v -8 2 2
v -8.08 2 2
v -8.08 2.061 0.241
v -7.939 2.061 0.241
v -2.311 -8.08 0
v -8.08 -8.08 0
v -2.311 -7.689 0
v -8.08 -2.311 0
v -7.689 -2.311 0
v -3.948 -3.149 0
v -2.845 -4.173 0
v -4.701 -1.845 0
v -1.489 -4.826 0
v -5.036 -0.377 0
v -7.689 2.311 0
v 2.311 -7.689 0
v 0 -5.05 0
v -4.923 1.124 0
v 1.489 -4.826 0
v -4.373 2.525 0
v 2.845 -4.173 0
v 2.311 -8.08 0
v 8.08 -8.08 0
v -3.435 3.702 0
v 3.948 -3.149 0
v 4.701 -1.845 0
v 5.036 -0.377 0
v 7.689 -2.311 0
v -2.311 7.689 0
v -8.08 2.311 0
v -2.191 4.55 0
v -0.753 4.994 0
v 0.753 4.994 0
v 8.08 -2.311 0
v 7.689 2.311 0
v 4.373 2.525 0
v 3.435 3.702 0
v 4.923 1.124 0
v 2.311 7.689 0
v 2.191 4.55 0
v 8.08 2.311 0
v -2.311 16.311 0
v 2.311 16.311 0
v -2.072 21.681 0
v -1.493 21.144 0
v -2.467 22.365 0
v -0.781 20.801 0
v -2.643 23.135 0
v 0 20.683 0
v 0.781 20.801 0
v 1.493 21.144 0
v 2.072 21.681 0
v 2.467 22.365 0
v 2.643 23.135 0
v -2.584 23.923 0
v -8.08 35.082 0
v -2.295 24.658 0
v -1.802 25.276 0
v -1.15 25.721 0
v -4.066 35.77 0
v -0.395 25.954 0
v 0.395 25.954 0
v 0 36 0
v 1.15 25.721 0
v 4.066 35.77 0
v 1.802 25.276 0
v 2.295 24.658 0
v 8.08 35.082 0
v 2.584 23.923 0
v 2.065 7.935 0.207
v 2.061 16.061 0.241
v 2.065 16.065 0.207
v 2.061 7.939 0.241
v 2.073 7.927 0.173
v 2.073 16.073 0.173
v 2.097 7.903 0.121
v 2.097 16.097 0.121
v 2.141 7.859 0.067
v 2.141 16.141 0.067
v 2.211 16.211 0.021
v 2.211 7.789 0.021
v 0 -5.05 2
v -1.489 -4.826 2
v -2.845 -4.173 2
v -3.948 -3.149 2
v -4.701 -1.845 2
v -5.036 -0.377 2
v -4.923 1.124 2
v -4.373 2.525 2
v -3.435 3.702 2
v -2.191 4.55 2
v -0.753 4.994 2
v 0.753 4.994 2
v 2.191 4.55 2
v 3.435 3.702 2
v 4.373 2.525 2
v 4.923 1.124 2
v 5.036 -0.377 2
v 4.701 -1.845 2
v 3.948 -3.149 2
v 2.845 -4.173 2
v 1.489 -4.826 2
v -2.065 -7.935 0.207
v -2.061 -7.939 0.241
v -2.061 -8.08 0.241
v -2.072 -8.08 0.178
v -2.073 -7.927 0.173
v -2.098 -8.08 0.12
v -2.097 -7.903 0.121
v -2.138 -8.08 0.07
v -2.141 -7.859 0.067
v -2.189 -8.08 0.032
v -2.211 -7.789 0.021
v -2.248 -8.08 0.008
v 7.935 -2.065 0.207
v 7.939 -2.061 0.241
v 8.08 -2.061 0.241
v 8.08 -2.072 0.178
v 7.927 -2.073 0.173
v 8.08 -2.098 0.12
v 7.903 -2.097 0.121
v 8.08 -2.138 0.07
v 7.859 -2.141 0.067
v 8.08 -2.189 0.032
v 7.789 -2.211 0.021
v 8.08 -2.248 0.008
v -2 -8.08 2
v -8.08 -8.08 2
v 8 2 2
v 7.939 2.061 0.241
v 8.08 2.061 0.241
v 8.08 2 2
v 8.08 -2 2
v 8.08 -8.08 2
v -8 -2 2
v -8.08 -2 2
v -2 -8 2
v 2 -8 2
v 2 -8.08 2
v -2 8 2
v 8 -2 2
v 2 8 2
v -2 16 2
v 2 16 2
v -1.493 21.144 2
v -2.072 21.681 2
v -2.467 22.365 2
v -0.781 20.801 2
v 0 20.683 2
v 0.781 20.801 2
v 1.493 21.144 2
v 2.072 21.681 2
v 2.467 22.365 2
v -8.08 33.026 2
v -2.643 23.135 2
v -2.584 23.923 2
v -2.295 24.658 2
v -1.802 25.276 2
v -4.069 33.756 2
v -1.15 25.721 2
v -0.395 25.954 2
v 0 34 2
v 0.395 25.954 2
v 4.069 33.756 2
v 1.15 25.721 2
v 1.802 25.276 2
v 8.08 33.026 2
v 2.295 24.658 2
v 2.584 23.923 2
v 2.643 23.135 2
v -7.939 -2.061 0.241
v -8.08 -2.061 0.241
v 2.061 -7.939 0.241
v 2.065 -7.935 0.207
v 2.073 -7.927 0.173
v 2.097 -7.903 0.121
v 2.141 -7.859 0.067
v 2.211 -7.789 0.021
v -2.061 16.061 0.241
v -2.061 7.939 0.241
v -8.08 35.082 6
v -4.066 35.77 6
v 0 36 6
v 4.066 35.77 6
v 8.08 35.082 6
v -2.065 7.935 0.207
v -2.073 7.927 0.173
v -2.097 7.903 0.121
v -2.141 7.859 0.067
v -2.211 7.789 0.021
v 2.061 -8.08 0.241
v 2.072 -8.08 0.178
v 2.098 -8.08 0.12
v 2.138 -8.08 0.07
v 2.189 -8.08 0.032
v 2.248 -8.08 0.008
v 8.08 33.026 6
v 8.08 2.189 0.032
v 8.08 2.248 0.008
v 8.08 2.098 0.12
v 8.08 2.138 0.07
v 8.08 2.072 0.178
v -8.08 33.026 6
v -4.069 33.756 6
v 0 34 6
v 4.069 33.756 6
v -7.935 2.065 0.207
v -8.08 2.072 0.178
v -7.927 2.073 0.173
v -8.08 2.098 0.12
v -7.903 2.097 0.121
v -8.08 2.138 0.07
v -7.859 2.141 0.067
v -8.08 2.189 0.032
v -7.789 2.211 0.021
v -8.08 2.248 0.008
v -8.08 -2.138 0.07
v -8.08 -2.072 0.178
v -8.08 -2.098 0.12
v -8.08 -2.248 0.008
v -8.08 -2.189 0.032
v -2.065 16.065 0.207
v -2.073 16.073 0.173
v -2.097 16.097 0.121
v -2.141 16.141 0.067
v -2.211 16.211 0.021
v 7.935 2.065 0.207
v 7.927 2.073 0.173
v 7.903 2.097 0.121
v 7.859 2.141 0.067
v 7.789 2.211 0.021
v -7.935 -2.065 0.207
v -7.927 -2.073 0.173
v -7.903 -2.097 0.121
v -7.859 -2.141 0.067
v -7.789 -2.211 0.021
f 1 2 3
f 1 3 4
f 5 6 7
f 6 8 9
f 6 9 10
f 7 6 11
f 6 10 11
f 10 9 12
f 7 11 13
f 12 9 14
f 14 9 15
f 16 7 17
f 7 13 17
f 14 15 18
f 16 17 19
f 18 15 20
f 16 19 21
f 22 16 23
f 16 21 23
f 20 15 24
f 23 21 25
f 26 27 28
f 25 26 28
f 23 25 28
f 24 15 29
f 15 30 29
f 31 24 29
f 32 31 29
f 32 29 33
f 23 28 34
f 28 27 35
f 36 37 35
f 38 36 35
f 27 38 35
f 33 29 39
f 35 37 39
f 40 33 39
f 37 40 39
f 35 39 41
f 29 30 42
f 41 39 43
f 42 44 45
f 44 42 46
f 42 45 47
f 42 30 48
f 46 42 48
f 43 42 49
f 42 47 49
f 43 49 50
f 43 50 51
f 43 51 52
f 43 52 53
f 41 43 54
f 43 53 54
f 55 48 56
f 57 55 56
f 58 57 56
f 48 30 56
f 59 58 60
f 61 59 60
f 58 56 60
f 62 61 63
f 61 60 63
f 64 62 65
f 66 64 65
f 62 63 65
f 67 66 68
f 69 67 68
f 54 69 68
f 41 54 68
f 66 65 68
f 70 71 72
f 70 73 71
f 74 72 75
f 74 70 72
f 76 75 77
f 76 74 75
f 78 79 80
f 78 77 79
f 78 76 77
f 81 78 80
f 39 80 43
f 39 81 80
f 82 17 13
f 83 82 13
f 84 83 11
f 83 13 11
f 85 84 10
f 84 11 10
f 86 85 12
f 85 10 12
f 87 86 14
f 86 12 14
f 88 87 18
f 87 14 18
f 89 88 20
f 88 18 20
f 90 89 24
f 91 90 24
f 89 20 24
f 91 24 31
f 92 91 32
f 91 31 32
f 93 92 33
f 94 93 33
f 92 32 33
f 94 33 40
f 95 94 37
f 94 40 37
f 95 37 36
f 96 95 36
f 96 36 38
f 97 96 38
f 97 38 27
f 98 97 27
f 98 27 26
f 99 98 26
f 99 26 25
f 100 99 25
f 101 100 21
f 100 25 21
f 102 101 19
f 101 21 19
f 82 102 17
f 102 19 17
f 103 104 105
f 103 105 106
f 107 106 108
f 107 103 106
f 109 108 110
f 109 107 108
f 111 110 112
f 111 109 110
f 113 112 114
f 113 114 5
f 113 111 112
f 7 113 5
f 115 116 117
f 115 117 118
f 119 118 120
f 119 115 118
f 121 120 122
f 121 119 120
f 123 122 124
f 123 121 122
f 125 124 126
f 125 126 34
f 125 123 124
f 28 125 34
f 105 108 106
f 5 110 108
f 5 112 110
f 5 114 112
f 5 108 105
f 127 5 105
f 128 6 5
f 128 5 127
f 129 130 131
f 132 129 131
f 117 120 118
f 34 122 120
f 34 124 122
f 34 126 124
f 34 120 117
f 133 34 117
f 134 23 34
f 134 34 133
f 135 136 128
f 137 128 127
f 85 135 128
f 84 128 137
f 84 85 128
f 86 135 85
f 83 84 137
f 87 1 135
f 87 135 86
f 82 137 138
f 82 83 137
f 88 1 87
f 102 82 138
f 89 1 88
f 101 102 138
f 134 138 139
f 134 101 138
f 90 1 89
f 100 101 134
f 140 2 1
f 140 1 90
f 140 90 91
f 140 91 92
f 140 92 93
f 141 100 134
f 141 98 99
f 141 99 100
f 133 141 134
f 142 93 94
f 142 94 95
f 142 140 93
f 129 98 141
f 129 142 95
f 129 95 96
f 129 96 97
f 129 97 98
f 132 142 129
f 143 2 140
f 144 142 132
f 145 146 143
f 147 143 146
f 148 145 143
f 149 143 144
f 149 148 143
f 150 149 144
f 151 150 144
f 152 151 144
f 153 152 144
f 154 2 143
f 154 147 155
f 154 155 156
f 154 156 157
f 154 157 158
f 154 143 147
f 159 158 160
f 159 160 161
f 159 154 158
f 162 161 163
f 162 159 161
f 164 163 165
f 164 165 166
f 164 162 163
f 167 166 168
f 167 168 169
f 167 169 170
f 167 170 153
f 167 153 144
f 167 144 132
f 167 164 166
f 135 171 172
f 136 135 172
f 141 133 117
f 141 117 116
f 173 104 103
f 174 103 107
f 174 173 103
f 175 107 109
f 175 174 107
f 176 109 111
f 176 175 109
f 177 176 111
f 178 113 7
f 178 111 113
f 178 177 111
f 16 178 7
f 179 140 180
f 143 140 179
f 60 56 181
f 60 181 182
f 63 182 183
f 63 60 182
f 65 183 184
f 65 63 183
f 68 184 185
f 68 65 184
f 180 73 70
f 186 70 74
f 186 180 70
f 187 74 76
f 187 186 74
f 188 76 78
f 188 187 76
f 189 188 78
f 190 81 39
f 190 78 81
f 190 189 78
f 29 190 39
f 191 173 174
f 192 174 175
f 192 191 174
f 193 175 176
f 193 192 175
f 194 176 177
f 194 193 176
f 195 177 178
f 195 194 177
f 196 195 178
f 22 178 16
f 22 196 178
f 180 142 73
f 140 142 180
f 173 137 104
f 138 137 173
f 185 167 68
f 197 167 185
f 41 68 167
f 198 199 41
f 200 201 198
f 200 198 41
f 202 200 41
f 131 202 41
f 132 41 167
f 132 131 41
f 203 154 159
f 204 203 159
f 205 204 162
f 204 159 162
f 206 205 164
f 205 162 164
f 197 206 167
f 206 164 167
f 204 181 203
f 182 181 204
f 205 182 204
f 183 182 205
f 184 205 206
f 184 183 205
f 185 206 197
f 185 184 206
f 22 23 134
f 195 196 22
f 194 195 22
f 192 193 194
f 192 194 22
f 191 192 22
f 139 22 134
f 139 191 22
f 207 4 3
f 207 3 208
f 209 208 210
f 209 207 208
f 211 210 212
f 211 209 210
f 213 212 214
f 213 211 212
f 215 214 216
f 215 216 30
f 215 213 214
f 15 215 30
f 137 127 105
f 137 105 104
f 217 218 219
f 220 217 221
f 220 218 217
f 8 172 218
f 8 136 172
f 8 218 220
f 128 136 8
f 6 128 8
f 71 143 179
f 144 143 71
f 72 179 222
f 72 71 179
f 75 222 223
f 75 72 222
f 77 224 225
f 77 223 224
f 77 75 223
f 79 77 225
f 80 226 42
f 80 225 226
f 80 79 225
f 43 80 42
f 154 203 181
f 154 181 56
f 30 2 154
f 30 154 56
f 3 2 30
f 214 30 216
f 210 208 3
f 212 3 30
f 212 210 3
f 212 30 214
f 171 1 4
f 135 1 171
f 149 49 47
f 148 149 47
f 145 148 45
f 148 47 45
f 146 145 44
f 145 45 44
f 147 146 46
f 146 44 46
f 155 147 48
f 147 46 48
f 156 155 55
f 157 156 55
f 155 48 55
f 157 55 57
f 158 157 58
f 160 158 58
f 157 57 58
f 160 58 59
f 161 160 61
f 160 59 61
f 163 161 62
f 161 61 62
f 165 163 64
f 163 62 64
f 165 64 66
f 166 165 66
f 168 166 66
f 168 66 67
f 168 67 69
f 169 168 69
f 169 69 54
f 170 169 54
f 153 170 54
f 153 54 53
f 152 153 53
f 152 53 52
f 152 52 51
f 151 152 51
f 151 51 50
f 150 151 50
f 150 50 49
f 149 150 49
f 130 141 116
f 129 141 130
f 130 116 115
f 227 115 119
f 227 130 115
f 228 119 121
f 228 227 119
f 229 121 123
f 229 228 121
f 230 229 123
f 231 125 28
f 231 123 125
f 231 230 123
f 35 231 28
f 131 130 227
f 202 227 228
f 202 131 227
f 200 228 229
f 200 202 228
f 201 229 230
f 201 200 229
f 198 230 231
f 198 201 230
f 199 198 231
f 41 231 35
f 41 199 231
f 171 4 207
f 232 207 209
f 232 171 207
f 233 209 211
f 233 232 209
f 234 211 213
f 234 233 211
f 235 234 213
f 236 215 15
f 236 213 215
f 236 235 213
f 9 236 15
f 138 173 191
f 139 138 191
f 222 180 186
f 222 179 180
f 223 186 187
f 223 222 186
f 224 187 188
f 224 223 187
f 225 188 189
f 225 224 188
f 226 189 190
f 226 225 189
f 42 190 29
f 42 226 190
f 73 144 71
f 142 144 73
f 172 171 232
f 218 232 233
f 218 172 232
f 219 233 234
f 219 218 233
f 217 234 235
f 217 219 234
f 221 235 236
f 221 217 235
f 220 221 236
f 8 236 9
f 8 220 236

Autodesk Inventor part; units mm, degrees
sketch "Sketch1" plane through (0, 0, 0) normal (0, 0, 1) x (1, 0, 0)
  circle A0 centre (0, 0) radius 36
  dimension "d0" = 72
extrude "Extrusion1" add sketch "Sketch1" along normal blind 2
sketch "Sketch2" plane through (0, 0, 2) normal (0, 0, 1) x (1, 0, 0)
  circle A0 centre (0, 0) radius 36 projected
  circle A1 centre (0, 0) radius 34
  dimension "d3" = 2
extrude "Extrusion2" add sketch "Sketch2" along normal blind 4
sketch "Sketch4" plane through (0, 0, 2) normal (0, 0, 1) x (1, 0, 0)
  point P0 (0, 0)
  point P1 (0, 0)
hole "Hole1" at (0, 0, 2) direction (0, 0, -1) diameter 10.1 end through all
sketch "Sketch5" plane through (0, 0, 2) normal (0, 0, 1) x (1, 0, 0)
  point P0 (0, 0)
  point P1 (0, 23.3333)
  dimension "d13" = 23.3333
hole "Hole2" at (0, 23.3333, 2) direction (0, 0, -1) diameter 5.3 end through all
pattern_circular "Circular Pattern1" count 5 over 360 about axis through (0, 0, -100) along (0, 0, 1) of "Hole2"
sketch "Sketch8" plane through (0, 0, 2) normal (0, 0, 1) x (1, 0, 0)
  circle A0 centre (22.1913, 7.2104) radius 2.65 projected
  circle A1 centre (13.715, -18.8771) radius 2.65 projected
  circle A2 centre (-13.715, -18.8771) radius 2.65 projected
  circle A3 centre (-22.1913, 7.2104) radius 2.65 projected
  circle A4 centre (0, 23.3333) radius 2.65 projected
  circle A5 centre (0, 0) radius 5.05 projected
  circle A6 centre (0, 0) radius 34 projected
  line L0 (-2, 16) -> (2, 16)
  line L1 (2, 16) -> (2, 8)
  line L2 (2, 8) -> (-2, 8)
  line L3 (-2, 8) -> (-2, 16)
  dimension "d43" = 4
  dimension "d44" = 8
  dimension "d45" = 8
  dimension "d48" = 2
extrude "Extrusion5" cut sketch "Sketch8" against normal up to surface (2 mm away) draft 2 contours L0 L1 L2 L3
fillet "Fillet2" radius 0.25 4 edges at (0, 7.9302, 0) (2.0698, 12, 0) (0, 16.0698, 0) (-2.0698, 12, 0)
pattern_circular "Circular Pattern3" count 4 over 360 about axis through (0, 0, -100) along (0, 0, 1) of "Extrusion5", "Fillet2"
ref_plane "Work Plane1" through (8.08, 0, 0) normal (1, 0, 0) x (0, 1, 0)
ref_plane "Work Plane2" through (-8.08, 0, 0) normal (1, 0, 0) x (0, 1, 0)
ref_plane "Work Plane3" through (0, -8.08, 0) normal (0, 1, 0) x (-1, 0, 0)
split "Split1" plane through (0, -8.08, 0) removes the side toward (0, -1, 0)
split "Split2" plane through (8.08, 0, 0) removes the side toward (1, 0, 0)
split "Split3" plane through (-8.08, 0, 0) removes the side toward (-1, 0, 0)
equation "\"d0\" = W_innerDiameter + W_wallThickness"
equation "\"d1\" = W_wallThickness"
equation "\"d3\" = W_wallThickness"
equation "\"d4\" = W_innerDepth"
equation "\"d6\" = W_innerGearHoleDiameter"
equation "\"d13\" = OG_distanceFromCenter"
equation "\"d14\" = W_outerGearHoleDiameter"
equation "\"W_wallThickness\" = 2"
equation "\"W_innerDepth\" = 4"
equation "\"W_innerGearHoleDiameter\" = 10.1"
equation "\"W_outerGearHoleDiameter\" = 5.3"
equation "\"OG_distanceFromCenter\" = 23.33333"
equation "\"W_innerDiameter\" = 70"
equation "\"Wheel_Related_W_\" = 0"
equation "\"W_holesClearance\" = 0.3"
equation "\"TempSpotReserved7\" = 0"
equation "\"TempSpotReserved8\" = 0"
equation "\"TempSpotReserved9\" = 0"
equation "\"TempSpotReserved10\" = 0"
equation "\"TempSpotReserved11\" = 0"
equation "\"TempSpotReserved12\" = 0"
equation "\"TempSpotReserved13\" = 0"
equation "\"TempSpotReserved14\" = 0"
equation "\"TempSpotReserved15\" = 0"
equation "\"TempSpotReserved16\" = 0"
equation "\"TempSpotReserved17\" = 0"
equation "\"TempSpotReserved18\" = 0"
equation "\"TempSpotReserved19\" = 0"
equation "\"TempSpotReserved20\" = 0"
equation "\"Inner_Gear_Related_IG_\" = 0"
equation "\"IG_shaftDiameter\" = 7.5"
equation "\"IG_shaftLength\" = 15"
equation "\"IG_gearThickness\" = 2"
equation "\"TempSpotReserved25\" = 0"
equation "\"TempSpotReserved26\" = 0"
equation "\"TempSpotReserved27\" = 0"
equation "\"TempSpotReserved28\" = 0"
equation "\"TempSpotReserved29\" = 0"
equation "\"TempSpotReserved30\" = 0"
equation "\"TempSpotReserved31\" = 0"
equation "\"TempSpotReserved32\" = 0"
equation "\"TempSpotReserved33\" = 0"
equation "\"TempSpotReserved34\" = 0"
equation "\"TempSpotReserved35\" = 0"
equation "\"TempSpotReserved36\" = 0"
equation "\"TempSpotReserved37\" = 0"
equation "\"TempSpotReserved38\" = 0"
equation "\"TempSpotReserved39\" = 0"
equation "\"TempSpotReserved40\" = 0"
equation "\"Outer_Gear_Related_OG_\" = 0"
equation "\"OG_shaftDiameter\" = 5"
equation "\"OG_gearDiameter\" = 26.66667"
equation "\"OG_shaftLength\" = 7"
equation "\"OG_gearThickness\" = 2"
equation "\"TempSpotReserved47\" = 0"
equation "\"TempSpotReserved48\" = 0"
equation "\"TempSpotReserved49\" = 0"
equation "\"TempSpotReserved50\" = 0"
equation "\"TempSpotReserved51\" = 0"
equation "\"TempSpotReserved52\" = 0"
equation "\"TempSpotReserved53\" = 0"
equation "\"TempSpotReserved54\" = 0"
equation "\"TempSpotReserved55\" = 0"
equation "\"TempSpotReserved56\" = 0"
equation "\"TempSpotReserved57\" = 0"
equation "\"TempSpotReserved58\" = 0"
equation "\"TempSpotReserved59\" = 0"
equation "\"TempSpotReserved60\" = 0"
equation "\"Leg_Extensions_Related_LE_\" = 0"
equation "\"LE_baseDiameter\" = 5"
equation "\"LE_maxLength\" = 24.6522"
equation "\"LE_thickness\" = 2.5"
equation "\"IG_ratioToOuterGear\" = 0.75"
equation "\"B_bearingThickness\" = 1"
equation "\"TempSpotReserved43\" = 0"
equation "\"TempSpotReserved45\" = 0"
equation "\"Thisisatest\" = 25.4"
equation "\"TempSpotReserved46\" = 0"
equation "\"TempSpotReserved44\" = 0"
equation "\"LE_offsetAboveOuterGear\" = 0"
equation "\"Bearing_Related_B_\" = 0"
equation "\"TempSpotReserved42\" = 0"
equation "\"OG_skirtOffset\" = 1"
equation "\"OG_skirtThickness\" = 1"
equation "\"IG_skirtThickness\" = 2"
equation "\"IG_extentionLength\" = 18.33333"
equation "\"IG_extentionThickness\" = 3"
equation "\"IG_slitWidth\" = 4"
equation "\"IG_slitlength\" = 8"
equation "\"IG_slitClearance\" = 0.2"
equation "\"IG_slitDistanceFromCenterHole\" = 8"
equation "\"Reserved_10\" = 0"
equation "\"Reserved_9\" = 0"
equation "\"Reserved_11\" = 0"
equation "\"Reserved_12\" = 0"
equation "\"Reserved_8\" = 0"
equation "\"Reserved_7\" = 0"
equation "\"Reserved_26\" = 0"
equation "\"Reserved_20\" = 0"
equation "\"Reserved_22\" = 0"
equation "\"Reserved_23\" = 0"
equation "\"Reserved_25\" = 0"
equation "\"Reserved_24\" = 0"
equation "\"Reserved_21\" = 0"
equation "\"Reserved_19\" = 0"
equation "\"Reserved_27\" = 0"
equation "\"Reserved_14\" = 0"
equation "\"Reserved_15\" = 0"
equation "\"Reserved_16\" = 0"
equation "\"Reserved_13\" = 0"
equation "\"Reserved_17\" = 0"
equation "\"Reserved_18\" = 0"
equation "\"Bearing_Related_BR_\" = 0"
equation "\"BR_bearingThickness\" = 1"
equation "\"Block_Related_BL_\" = 0"
equation "\"BL_width\" = 3.8"
equation "\"BL_length\" = 7.8"
equation "\"W_filletRadius\" = 0.25"
equation "\"W_extrutsionTaperAngle\" = 2deg"
equation "\"OG_protrudeDistance\" = 3"
properties part number "wheel1"
